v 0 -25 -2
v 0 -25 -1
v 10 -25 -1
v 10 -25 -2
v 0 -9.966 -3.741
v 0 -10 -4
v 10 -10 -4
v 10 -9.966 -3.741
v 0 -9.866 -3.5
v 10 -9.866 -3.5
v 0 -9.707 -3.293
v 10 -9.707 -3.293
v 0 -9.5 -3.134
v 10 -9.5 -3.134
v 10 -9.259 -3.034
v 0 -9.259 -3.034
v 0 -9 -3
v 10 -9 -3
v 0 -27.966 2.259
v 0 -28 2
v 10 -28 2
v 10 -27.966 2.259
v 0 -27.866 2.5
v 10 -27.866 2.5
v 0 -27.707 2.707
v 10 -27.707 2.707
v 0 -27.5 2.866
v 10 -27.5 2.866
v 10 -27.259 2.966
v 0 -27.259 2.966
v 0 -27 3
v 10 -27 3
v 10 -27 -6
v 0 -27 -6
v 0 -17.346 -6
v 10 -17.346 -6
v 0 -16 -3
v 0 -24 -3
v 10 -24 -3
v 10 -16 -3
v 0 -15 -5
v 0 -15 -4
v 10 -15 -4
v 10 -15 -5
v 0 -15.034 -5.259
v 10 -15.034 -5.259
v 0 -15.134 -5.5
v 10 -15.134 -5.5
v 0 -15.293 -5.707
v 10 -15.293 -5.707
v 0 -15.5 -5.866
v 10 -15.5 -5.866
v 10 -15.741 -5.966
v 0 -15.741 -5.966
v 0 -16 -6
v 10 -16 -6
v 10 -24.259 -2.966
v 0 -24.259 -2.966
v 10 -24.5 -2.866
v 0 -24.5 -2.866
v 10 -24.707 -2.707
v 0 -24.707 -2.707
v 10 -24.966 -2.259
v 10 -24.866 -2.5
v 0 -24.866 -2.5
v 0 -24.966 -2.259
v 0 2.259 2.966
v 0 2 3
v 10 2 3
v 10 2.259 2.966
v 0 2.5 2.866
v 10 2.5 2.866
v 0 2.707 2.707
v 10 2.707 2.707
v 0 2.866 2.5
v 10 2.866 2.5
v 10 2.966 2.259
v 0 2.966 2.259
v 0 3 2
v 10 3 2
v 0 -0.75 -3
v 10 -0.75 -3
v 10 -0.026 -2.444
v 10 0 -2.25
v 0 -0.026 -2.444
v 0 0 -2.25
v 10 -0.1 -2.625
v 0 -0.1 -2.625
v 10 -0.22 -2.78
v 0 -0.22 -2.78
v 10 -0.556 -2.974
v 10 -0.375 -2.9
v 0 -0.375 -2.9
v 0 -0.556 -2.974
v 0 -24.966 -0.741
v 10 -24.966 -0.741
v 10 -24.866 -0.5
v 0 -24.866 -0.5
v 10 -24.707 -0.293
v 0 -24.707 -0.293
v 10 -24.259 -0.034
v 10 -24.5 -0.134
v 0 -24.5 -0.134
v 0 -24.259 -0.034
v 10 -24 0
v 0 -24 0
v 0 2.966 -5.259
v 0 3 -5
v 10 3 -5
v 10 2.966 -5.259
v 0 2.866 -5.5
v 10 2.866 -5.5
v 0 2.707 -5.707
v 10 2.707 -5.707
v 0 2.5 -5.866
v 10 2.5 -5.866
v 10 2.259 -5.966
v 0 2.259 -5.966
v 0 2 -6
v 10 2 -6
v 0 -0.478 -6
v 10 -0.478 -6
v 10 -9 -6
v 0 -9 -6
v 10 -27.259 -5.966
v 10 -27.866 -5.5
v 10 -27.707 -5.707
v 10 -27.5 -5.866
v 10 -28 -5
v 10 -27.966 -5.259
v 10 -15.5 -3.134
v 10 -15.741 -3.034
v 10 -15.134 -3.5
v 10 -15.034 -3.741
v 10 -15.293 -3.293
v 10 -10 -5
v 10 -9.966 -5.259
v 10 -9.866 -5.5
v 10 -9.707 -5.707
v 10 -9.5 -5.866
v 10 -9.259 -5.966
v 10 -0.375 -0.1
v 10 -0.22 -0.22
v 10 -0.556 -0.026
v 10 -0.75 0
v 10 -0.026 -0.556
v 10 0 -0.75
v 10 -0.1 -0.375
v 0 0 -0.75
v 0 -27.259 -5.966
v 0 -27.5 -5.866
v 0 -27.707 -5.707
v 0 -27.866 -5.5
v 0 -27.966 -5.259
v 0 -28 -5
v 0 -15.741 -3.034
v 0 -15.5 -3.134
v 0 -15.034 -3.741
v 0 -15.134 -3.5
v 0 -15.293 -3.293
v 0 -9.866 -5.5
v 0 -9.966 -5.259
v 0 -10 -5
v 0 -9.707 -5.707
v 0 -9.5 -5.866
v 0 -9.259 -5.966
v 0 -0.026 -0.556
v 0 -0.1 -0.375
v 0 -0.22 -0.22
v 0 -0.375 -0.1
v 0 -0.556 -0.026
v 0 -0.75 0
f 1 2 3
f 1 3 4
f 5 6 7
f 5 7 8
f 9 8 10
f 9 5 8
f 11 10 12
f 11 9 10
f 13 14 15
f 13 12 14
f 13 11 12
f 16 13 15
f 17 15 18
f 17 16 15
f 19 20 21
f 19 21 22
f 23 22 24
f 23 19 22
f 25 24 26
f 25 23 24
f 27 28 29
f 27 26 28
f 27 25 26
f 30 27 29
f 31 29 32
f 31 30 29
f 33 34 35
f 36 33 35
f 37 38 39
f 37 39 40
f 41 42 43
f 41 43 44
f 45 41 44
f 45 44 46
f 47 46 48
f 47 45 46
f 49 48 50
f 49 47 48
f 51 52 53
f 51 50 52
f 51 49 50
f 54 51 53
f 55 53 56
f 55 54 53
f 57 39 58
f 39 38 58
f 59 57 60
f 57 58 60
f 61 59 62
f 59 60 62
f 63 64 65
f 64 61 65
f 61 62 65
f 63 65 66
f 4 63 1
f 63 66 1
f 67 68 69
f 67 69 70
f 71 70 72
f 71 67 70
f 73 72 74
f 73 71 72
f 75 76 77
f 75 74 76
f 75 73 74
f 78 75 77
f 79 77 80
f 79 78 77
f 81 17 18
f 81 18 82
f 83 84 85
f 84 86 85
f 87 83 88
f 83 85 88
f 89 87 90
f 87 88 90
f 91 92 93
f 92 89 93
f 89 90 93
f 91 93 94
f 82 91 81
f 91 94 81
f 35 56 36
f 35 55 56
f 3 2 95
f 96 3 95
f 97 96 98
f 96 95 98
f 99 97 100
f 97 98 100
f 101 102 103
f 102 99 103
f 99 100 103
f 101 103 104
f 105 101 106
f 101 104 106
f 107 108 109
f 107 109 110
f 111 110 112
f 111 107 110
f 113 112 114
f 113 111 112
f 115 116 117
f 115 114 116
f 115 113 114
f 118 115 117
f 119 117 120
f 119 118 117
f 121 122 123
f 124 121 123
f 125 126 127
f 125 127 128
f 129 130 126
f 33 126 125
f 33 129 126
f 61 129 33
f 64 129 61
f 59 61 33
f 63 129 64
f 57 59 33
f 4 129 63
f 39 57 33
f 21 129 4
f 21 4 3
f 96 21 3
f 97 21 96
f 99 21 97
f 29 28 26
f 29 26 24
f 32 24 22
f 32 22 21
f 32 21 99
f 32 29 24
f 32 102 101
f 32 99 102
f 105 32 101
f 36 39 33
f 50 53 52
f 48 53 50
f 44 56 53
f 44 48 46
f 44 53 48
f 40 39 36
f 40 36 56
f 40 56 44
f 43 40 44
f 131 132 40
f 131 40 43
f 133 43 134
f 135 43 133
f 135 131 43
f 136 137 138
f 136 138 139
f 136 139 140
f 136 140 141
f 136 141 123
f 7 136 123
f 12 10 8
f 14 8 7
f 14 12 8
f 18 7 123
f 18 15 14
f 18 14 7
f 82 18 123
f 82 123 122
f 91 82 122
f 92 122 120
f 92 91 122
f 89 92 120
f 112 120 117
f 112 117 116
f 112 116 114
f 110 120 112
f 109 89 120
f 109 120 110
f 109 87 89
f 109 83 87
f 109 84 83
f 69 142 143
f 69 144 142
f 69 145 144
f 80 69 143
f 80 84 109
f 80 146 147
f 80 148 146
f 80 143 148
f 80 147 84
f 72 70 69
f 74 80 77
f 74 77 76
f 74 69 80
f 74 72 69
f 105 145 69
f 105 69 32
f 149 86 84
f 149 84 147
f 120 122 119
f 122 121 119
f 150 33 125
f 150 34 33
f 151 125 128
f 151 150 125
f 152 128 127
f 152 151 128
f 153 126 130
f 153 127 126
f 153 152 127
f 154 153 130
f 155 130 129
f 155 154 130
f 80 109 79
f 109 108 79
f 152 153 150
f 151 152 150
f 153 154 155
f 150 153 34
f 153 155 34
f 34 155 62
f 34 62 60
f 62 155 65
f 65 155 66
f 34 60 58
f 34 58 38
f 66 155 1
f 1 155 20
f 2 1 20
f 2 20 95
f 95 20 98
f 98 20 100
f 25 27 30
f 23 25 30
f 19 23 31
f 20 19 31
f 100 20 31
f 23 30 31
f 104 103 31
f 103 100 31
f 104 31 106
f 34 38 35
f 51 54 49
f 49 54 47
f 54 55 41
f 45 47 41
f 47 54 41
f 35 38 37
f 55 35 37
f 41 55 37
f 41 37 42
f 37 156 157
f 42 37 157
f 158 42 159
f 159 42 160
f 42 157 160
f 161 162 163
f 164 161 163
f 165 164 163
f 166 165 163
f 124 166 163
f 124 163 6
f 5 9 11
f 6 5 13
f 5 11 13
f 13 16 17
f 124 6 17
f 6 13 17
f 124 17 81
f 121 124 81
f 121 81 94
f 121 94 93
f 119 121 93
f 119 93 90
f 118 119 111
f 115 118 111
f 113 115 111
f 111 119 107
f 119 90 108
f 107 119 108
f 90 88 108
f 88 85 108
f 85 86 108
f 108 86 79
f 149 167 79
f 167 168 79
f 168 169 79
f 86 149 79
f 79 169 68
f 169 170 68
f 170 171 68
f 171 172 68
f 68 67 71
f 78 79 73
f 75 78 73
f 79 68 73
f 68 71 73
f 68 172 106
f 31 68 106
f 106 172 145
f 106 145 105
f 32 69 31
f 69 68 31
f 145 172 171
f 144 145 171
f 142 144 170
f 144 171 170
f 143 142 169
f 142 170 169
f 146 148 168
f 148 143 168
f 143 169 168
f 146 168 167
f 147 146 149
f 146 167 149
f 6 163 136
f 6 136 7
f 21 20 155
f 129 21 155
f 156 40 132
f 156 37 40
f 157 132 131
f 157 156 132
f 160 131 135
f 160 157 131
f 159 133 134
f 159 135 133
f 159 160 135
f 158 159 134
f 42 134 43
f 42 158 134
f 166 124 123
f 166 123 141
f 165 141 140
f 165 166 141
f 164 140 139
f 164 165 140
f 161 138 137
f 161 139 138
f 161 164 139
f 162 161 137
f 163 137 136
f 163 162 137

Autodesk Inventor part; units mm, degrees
ref_plane "YZ Plane" through (0, 0, 0) normal (1, 0, 0) x (0, 1, 0)
ref_plane "XZ Plane" through (0, 0, 0) normal (0, 1, 0) x (-1, 0, 0)
ref_plane "XY Plane" through (0, 0, 0) normal (0, 0, 1) x (1, 0, 0)
sketch "Эскиз1" plane through (0, 0, 0) normal (1, 0, 0) x (0, 1, 0)
  line L0 (-0.75, 0) -> (-24, 0)
  line L1 (-25, -1) -> (-25, -2)
  line L2 (0, -2.25) -> (0, -0.75)
  line L3 (2, 3) -> (-27, 3)
  line L4 (-28, 2) -> (-28, -5)
  line L5 (3, -5) -> (3, 2)
  line L6 (-15, -4) -> (-15, -5)
  line L7 (-10, -5) -> (-10, -4)
  arc A0 (2, -6) -> (3, -5) centre (2, -5) ccw
  arc A1 (3, 2) -> (2, 3) centre (2, 2) ccw
  arc A2 (-27, 3) -> (-28, 2) centre (-27, 2) ccw
  arc A3 (-28, -5) -> (-27, -6) centre (-27, -5) ccw
  arc A4 (-25, -2) -> (-24, -3) centre (-24, -2) ccw
  arc A5 (-24, 0) -> (-25, -1) centre (-24, -1) ccw
  arc A6 (0, -0.75) -> (-0.75, 0) centre (-0.75, -0.75) ccw
  arc A7 (-0.75, -3) -> (0, -2.25) centre (-0.75, -2.25) ccw
  line L8 (-0.4776, -6) -> (-9, -6)
  line L9 (-16, -6) -> (-17.3462, -6)
  line L10 (-24, -3) -> (-16, -3)
  line L11 (-9, -3) -> (-0.75, -3)
  line L12 (-27, -6) -> (-16, -6)
  line L13 (-9, -6) -> (2, -6)
  arc A8 (-9, -3) -> (-10, -4) centre (-9, -4) ccw
  arc A9 (-10, -5) -> (-9, -6) centre (-9, -5) ccw
  arc A10 (-15, -4) -> (-16, -3) centre (-16, -4) ccw
  arc A11 (-16, -6) -> (-15, -5) centre (-16, -5) ccw
  line L14 (2, -5) -> (-27, 2) construction
  line L15 (2, 2) -> (-27, -5) construction
  line L16 (-10, -4) -> (3, -4) construction
  line L17 (-15, -4) -> (-28, -4) construction
  point P0 (0, 0)
  point P1 (-25, -3)
  point P2 (-25, 0)
  point P3 (0, -3)
  dimension "d1" = 3
  dimension "d4" = 3
  dimension "d5" = 3
  dimension "d6" = 3
  dimension "d7" = 5
  dimension "d8" = 1
  dimension "d9" = 0.75
  dimension "d10" = 13
  dimension "d11" = 1
  dimension "d12" = 1
  dimension "d15" = 3
  dimension "d16" = 25
extrude "Выдавливание1" add sketch "Эскиз1" along normal blind 10
properties part number "_3DПЕЧАТЬ"
